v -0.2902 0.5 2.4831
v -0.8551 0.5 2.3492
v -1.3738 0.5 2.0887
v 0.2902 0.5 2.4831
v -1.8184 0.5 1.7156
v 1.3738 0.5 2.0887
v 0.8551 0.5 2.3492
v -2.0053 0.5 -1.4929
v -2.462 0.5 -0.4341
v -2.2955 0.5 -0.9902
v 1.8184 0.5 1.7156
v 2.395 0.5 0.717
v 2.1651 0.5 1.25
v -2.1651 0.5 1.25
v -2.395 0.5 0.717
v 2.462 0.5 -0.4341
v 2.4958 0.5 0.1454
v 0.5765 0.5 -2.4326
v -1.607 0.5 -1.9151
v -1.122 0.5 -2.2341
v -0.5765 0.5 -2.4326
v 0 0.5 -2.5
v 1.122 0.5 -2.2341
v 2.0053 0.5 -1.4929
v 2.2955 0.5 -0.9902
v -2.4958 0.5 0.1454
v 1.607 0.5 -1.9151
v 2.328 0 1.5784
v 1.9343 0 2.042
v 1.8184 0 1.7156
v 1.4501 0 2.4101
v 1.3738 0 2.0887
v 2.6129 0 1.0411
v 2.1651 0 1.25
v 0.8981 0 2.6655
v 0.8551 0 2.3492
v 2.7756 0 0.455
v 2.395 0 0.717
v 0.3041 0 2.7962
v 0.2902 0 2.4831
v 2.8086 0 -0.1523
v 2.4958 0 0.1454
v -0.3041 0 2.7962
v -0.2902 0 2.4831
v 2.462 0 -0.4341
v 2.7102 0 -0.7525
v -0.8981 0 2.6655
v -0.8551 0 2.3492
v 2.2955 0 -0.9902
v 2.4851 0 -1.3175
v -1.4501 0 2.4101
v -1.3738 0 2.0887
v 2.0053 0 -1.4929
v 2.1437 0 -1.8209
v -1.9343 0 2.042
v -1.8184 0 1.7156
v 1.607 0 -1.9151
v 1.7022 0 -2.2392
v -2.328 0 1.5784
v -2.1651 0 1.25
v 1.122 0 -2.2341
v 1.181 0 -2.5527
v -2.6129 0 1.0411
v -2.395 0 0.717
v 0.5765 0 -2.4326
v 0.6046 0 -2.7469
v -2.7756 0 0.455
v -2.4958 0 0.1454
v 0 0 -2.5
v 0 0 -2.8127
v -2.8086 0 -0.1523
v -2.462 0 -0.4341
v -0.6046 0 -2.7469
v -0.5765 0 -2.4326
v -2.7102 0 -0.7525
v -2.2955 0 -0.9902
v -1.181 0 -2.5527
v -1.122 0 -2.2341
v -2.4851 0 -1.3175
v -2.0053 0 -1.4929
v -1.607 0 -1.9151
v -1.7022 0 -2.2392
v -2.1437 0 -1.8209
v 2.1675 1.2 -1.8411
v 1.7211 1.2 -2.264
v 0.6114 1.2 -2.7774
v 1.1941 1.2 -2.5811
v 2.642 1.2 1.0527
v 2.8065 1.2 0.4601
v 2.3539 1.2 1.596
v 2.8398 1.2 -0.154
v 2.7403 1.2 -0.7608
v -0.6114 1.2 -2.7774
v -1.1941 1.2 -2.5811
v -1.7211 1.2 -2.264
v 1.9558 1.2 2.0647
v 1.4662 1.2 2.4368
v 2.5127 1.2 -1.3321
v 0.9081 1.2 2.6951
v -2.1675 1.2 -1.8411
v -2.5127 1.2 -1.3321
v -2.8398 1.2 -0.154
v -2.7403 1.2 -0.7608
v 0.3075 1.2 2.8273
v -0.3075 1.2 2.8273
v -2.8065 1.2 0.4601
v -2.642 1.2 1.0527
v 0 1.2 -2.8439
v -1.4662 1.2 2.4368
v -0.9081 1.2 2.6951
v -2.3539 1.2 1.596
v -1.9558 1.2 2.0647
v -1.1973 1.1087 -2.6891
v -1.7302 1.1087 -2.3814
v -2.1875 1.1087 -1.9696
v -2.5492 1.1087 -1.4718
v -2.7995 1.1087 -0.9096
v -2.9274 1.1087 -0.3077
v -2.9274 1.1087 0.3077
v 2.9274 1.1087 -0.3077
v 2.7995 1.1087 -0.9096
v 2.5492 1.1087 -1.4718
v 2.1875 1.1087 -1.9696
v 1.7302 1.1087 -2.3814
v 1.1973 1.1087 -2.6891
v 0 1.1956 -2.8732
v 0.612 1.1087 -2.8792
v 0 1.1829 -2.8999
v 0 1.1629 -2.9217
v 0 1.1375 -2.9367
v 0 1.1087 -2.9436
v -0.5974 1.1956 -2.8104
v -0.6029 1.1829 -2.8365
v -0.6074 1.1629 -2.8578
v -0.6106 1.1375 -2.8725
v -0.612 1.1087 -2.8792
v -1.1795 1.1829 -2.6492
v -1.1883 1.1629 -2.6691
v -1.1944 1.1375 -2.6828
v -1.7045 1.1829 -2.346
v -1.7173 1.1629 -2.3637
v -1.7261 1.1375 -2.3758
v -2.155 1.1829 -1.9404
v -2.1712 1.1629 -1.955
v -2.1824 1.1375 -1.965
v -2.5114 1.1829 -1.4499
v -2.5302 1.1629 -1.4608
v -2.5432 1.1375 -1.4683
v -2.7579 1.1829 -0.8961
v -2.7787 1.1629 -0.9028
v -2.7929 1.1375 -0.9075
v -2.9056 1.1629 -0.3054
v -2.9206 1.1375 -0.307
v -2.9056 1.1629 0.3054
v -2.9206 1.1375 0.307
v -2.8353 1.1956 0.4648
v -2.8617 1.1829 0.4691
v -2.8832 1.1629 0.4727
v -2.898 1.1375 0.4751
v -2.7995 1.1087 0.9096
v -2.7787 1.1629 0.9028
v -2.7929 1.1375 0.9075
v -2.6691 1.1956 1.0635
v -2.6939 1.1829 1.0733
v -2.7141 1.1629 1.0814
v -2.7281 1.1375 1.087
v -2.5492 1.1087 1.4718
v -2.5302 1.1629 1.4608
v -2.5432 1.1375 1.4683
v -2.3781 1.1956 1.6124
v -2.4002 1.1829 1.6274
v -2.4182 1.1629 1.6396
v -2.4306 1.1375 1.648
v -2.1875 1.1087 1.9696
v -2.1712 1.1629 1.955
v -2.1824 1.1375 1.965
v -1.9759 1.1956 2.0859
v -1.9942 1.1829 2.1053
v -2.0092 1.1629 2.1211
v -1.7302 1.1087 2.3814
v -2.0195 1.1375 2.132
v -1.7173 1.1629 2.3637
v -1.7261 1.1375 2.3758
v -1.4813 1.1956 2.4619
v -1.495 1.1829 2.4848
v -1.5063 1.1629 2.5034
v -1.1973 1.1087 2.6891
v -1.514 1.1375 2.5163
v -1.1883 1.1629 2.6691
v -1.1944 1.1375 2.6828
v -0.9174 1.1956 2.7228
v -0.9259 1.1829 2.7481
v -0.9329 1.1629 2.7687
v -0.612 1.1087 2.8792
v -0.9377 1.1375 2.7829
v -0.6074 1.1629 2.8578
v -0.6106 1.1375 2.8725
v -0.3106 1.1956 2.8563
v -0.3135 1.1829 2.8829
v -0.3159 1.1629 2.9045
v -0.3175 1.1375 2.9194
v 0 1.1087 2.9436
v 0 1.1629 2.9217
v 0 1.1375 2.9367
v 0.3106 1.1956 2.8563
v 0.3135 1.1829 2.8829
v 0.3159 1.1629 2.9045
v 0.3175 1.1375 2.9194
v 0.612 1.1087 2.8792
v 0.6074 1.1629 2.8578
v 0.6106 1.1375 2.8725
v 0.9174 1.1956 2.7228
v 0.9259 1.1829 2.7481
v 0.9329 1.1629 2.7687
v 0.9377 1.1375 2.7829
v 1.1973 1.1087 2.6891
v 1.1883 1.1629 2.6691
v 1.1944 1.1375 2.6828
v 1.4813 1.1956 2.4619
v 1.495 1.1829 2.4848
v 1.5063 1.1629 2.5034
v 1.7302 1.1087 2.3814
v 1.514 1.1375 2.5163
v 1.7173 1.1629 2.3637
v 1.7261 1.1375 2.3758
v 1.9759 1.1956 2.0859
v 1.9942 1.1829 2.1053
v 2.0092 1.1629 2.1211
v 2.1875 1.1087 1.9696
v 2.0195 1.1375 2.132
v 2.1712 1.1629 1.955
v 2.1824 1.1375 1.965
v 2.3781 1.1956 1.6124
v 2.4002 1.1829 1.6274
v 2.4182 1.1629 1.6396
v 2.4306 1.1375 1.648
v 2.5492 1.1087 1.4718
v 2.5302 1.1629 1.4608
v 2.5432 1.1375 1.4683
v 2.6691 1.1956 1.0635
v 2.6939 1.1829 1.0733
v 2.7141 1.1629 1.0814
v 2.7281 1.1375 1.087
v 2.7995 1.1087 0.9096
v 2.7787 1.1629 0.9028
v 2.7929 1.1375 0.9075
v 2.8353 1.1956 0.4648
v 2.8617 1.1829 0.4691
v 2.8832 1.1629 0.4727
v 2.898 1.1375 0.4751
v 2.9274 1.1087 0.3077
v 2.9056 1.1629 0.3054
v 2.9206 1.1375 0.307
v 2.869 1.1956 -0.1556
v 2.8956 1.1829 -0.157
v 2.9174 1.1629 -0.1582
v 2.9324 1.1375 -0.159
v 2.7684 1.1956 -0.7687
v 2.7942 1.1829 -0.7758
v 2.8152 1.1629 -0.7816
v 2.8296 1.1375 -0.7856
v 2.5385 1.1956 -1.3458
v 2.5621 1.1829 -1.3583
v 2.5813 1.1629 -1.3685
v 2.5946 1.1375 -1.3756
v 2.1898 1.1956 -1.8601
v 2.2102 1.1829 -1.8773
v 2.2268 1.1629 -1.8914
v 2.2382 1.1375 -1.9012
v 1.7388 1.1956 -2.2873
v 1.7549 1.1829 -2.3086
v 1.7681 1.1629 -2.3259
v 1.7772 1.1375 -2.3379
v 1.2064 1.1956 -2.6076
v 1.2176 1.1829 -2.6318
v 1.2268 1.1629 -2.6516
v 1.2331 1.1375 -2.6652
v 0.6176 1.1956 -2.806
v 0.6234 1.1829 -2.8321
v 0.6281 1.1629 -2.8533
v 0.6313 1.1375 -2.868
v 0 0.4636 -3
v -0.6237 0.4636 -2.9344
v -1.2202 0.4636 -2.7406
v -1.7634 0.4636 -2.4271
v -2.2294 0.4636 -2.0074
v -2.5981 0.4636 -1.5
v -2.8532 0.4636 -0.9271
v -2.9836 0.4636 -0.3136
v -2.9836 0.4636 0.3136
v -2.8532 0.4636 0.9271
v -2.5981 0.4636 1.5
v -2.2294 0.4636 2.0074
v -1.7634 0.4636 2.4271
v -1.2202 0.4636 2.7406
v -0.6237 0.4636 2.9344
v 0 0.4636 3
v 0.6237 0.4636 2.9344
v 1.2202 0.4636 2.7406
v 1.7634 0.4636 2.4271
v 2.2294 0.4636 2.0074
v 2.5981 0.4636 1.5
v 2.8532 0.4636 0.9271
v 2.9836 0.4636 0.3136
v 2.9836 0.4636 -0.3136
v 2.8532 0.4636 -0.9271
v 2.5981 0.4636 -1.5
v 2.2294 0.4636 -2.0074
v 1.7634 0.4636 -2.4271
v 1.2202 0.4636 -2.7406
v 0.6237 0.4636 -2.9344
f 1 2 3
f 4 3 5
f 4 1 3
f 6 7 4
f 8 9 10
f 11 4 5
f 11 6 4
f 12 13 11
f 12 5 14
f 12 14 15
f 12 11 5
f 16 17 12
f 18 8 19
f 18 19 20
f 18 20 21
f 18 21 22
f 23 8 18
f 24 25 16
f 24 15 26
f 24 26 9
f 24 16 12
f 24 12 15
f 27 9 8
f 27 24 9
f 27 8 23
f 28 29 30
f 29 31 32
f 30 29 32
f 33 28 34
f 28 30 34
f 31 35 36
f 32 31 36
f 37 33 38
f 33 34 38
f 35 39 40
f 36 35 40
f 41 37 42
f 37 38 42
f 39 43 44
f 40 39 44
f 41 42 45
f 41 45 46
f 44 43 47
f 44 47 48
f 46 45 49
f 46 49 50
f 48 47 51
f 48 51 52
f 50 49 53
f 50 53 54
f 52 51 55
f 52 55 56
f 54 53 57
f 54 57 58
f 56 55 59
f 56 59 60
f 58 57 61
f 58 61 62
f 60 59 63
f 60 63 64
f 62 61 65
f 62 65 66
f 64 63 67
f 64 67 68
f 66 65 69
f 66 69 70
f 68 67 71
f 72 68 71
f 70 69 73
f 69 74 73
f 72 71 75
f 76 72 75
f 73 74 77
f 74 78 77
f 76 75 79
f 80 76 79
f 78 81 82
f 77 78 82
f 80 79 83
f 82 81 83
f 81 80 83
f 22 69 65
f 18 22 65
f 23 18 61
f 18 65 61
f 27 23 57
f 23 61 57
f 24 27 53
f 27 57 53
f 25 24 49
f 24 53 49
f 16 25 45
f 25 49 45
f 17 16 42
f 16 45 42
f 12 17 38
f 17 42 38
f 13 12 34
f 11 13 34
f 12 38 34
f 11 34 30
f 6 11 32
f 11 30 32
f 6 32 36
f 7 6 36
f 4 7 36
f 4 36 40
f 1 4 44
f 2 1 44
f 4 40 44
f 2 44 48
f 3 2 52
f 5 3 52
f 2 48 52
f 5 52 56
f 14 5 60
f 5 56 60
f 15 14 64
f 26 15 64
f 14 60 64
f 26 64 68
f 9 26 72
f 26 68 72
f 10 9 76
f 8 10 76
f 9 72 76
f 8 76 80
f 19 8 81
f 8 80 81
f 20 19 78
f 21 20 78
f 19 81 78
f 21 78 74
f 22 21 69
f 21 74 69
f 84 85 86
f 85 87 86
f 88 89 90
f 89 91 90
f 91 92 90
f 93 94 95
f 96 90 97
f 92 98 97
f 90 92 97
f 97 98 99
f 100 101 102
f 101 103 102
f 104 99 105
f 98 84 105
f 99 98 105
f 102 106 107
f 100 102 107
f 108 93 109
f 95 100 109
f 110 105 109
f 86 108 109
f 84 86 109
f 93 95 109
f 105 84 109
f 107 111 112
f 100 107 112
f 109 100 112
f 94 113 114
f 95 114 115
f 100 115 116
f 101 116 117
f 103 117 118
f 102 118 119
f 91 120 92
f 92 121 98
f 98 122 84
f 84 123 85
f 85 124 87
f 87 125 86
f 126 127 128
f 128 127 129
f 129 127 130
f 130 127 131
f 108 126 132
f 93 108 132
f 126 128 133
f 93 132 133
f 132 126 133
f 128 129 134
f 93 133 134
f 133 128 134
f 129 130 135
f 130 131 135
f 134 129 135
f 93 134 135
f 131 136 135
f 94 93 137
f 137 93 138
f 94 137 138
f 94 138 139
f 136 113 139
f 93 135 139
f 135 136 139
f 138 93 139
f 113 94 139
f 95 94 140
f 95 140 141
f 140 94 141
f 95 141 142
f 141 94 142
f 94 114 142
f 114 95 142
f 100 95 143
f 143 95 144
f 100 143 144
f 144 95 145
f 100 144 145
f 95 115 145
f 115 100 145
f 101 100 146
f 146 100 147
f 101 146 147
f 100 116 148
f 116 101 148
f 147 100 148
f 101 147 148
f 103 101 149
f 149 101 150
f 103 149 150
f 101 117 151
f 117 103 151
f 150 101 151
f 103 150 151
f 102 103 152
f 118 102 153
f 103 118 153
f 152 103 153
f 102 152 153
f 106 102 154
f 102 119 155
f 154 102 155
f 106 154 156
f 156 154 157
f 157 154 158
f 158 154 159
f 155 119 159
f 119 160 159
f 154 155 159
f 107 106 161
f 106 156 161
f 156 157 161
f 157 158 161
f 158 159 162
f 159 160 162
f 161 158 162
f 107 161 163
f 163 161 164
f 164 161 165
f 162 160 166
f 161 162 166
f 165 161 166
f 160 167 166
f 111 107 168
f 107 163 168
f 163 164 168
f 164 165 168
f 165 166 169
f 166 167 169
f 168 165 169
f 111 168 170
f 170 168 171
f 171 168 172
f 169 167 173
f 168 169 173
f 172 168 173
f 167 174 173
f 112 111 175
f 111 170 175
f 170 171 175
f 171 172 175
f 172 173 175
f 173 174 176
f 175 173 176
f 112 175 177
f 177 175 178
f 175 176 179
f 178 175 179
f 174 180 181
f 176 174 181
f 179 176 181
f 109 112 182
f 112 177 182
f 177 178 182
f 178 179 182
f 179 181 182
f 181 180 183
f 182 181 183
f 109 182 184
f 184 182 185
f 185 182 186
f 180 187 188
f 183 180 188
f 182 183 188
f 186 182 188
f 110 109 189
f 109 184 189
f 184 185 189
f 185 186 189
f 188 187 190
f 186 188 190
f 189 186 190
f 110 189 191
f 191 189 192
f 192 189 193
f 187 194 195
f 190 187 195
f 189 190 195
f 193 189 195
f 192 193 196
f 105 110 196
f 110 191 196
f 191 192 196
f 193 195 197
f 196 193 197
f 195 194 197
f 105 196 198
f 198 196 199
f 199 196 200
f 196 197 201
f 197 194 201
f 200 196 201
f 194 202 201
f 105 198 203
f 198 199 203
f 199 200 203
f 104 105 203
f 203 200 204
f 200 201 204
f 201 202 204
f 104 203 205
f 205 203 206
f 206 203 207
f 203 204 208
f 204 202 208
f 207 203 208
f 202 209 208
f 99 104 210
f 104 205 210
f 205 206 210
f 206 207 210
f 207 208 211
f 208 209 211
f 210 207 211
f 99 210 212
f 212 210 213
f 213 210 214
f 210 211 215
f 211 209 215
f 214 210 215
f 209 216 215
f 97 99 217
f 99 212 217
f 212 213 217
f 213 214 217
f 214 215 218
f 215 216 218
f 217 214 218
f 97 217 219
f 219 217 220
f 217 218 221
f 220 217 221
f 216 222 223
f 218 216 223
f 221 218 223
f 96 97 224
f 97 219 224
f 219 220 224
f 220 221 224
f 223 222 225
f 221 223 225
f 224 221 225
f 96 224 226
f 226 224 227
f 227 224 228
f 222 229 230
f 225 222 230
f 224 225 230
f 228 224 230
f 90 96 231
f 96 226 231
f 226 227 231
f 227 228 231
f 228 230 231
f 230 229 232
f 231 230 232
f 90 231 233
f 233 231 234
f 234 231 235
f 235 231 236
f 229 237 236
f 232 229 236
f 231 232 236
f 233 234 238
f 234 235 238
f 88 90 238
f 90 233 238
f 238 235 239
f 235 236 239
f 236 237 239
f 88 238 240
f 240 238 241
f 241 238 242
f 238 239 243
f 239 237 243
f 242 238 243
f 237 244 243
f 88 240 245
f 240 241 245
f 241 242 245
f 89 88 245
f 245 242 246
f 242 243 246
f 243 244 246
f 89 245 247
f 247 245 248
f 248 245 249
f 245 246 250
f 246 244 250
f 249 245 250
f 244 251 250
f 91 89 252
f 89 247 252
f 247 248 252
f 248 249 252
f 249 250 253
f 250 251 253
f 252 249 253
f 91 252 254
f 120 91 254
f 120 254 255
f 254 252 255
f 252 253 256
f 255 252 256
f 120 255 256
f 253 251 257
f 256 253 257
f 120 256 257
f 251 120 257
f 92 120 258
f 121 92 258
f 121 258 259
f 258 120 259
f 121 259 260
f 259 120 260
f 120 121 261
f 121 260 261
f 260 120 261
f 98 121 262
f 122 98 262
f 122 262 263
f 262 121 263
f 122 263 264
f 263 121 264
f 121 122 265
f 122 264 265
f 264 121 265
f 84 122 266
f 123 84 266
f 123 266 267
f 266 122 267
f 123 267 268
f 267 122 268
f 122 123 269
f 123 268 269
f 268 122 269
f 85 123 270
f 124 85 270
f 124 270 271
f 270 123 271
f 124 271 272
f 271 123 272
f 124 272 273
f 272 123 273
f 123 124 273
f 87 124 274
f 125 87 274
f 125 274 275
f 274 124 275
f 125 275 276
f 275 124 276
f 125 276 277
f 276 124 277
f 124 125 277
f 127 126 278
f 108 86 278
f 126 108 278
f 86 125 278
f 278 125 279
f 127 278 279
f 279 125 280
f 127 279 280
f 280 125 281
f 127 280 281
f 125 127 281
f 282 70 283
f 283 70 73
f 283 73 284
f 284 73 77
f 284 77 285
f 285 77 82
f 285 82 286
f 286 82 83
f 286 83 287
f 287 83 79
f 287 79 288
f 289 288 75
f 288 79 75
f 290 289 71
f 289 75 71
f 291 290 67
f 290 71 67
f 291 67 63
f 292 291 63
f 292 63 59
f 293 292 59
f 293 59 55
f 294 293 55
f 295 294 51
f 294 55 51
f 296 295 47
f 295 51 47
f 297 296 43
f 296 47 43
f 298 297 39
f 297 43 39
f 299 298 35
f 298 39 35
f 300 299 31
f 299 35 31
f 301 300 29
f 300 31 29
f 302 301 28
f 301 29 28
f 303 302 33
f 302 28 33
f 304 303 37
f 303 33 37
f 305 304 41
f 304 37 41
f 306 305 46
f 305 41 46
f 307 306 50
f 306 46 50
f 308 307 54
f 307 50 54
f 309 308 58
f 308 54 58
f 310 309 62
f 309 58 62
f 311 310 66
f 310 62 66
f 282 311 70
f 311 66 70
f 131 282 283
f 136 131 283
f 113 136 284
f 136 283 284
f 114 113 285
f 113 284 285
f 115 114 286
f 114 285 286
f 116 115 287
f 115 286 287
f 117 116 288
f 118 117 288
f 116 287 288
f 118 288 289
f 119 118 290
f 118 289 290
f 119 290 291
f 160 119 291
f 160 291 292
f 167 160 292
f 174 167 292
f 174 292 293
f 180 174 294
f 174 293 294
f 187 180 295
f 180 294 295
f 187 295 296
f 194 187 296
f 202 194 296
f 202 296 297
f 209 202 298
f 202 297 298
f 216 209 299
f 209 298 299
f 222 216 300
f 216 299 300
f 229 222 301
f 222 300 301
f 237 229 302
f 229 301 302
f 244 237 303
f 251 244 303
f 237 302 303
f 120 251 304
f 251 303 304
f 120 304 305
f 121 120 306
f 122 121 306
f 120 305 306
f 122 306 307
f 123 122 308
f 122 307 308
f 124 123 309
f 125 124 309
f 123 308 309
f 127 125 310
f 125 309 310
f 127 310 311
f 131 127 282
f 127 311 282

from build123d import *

# Parameters (mm, degrees)
FILLET1_R          = 0.1
SKETCH2_R          = 2.5
CUT_EXTRUDE1_DEPTH = 0.5


with BuildPart() as part:
    # Sketch1 → Revolve1 (revolve)
    with BuildSketch(Plane.XY, mode=Mode.PRIVATE) as revolve1_sk:
        Polygon((0, 0), (0, 1.2), (2.935572642, 1.2), (3, 0.463591927), (2.812696703, 0), align=None)
    revolve(revolve1_sk.sketch.rotate(Axis((0, 0, 0), (0, 1, 0)), 90), axis=Axis((0, 0, 0), (0, 1, 0)))

    # Fillet1
    fillet1_edges = [part.edges().sort_by_distance(p)[0] for p in [
        (0, 1.2, 2.935572642),
    ]]
    fillet(fillet1_edges, radius=FILLET1_R)

    # Sketch2 → Cut-Extrude1 (cut)
    with BuildSketch(Plane.XZ):
        with Locations(Location((0, 0, 0), (0, 0, 270))):
            Circle(SKETCH2_R)
    extrude(amount=-CUT_EXTRUDE1_DEPTH, mode=Mode.SUBTRACT)


solid = part.part
